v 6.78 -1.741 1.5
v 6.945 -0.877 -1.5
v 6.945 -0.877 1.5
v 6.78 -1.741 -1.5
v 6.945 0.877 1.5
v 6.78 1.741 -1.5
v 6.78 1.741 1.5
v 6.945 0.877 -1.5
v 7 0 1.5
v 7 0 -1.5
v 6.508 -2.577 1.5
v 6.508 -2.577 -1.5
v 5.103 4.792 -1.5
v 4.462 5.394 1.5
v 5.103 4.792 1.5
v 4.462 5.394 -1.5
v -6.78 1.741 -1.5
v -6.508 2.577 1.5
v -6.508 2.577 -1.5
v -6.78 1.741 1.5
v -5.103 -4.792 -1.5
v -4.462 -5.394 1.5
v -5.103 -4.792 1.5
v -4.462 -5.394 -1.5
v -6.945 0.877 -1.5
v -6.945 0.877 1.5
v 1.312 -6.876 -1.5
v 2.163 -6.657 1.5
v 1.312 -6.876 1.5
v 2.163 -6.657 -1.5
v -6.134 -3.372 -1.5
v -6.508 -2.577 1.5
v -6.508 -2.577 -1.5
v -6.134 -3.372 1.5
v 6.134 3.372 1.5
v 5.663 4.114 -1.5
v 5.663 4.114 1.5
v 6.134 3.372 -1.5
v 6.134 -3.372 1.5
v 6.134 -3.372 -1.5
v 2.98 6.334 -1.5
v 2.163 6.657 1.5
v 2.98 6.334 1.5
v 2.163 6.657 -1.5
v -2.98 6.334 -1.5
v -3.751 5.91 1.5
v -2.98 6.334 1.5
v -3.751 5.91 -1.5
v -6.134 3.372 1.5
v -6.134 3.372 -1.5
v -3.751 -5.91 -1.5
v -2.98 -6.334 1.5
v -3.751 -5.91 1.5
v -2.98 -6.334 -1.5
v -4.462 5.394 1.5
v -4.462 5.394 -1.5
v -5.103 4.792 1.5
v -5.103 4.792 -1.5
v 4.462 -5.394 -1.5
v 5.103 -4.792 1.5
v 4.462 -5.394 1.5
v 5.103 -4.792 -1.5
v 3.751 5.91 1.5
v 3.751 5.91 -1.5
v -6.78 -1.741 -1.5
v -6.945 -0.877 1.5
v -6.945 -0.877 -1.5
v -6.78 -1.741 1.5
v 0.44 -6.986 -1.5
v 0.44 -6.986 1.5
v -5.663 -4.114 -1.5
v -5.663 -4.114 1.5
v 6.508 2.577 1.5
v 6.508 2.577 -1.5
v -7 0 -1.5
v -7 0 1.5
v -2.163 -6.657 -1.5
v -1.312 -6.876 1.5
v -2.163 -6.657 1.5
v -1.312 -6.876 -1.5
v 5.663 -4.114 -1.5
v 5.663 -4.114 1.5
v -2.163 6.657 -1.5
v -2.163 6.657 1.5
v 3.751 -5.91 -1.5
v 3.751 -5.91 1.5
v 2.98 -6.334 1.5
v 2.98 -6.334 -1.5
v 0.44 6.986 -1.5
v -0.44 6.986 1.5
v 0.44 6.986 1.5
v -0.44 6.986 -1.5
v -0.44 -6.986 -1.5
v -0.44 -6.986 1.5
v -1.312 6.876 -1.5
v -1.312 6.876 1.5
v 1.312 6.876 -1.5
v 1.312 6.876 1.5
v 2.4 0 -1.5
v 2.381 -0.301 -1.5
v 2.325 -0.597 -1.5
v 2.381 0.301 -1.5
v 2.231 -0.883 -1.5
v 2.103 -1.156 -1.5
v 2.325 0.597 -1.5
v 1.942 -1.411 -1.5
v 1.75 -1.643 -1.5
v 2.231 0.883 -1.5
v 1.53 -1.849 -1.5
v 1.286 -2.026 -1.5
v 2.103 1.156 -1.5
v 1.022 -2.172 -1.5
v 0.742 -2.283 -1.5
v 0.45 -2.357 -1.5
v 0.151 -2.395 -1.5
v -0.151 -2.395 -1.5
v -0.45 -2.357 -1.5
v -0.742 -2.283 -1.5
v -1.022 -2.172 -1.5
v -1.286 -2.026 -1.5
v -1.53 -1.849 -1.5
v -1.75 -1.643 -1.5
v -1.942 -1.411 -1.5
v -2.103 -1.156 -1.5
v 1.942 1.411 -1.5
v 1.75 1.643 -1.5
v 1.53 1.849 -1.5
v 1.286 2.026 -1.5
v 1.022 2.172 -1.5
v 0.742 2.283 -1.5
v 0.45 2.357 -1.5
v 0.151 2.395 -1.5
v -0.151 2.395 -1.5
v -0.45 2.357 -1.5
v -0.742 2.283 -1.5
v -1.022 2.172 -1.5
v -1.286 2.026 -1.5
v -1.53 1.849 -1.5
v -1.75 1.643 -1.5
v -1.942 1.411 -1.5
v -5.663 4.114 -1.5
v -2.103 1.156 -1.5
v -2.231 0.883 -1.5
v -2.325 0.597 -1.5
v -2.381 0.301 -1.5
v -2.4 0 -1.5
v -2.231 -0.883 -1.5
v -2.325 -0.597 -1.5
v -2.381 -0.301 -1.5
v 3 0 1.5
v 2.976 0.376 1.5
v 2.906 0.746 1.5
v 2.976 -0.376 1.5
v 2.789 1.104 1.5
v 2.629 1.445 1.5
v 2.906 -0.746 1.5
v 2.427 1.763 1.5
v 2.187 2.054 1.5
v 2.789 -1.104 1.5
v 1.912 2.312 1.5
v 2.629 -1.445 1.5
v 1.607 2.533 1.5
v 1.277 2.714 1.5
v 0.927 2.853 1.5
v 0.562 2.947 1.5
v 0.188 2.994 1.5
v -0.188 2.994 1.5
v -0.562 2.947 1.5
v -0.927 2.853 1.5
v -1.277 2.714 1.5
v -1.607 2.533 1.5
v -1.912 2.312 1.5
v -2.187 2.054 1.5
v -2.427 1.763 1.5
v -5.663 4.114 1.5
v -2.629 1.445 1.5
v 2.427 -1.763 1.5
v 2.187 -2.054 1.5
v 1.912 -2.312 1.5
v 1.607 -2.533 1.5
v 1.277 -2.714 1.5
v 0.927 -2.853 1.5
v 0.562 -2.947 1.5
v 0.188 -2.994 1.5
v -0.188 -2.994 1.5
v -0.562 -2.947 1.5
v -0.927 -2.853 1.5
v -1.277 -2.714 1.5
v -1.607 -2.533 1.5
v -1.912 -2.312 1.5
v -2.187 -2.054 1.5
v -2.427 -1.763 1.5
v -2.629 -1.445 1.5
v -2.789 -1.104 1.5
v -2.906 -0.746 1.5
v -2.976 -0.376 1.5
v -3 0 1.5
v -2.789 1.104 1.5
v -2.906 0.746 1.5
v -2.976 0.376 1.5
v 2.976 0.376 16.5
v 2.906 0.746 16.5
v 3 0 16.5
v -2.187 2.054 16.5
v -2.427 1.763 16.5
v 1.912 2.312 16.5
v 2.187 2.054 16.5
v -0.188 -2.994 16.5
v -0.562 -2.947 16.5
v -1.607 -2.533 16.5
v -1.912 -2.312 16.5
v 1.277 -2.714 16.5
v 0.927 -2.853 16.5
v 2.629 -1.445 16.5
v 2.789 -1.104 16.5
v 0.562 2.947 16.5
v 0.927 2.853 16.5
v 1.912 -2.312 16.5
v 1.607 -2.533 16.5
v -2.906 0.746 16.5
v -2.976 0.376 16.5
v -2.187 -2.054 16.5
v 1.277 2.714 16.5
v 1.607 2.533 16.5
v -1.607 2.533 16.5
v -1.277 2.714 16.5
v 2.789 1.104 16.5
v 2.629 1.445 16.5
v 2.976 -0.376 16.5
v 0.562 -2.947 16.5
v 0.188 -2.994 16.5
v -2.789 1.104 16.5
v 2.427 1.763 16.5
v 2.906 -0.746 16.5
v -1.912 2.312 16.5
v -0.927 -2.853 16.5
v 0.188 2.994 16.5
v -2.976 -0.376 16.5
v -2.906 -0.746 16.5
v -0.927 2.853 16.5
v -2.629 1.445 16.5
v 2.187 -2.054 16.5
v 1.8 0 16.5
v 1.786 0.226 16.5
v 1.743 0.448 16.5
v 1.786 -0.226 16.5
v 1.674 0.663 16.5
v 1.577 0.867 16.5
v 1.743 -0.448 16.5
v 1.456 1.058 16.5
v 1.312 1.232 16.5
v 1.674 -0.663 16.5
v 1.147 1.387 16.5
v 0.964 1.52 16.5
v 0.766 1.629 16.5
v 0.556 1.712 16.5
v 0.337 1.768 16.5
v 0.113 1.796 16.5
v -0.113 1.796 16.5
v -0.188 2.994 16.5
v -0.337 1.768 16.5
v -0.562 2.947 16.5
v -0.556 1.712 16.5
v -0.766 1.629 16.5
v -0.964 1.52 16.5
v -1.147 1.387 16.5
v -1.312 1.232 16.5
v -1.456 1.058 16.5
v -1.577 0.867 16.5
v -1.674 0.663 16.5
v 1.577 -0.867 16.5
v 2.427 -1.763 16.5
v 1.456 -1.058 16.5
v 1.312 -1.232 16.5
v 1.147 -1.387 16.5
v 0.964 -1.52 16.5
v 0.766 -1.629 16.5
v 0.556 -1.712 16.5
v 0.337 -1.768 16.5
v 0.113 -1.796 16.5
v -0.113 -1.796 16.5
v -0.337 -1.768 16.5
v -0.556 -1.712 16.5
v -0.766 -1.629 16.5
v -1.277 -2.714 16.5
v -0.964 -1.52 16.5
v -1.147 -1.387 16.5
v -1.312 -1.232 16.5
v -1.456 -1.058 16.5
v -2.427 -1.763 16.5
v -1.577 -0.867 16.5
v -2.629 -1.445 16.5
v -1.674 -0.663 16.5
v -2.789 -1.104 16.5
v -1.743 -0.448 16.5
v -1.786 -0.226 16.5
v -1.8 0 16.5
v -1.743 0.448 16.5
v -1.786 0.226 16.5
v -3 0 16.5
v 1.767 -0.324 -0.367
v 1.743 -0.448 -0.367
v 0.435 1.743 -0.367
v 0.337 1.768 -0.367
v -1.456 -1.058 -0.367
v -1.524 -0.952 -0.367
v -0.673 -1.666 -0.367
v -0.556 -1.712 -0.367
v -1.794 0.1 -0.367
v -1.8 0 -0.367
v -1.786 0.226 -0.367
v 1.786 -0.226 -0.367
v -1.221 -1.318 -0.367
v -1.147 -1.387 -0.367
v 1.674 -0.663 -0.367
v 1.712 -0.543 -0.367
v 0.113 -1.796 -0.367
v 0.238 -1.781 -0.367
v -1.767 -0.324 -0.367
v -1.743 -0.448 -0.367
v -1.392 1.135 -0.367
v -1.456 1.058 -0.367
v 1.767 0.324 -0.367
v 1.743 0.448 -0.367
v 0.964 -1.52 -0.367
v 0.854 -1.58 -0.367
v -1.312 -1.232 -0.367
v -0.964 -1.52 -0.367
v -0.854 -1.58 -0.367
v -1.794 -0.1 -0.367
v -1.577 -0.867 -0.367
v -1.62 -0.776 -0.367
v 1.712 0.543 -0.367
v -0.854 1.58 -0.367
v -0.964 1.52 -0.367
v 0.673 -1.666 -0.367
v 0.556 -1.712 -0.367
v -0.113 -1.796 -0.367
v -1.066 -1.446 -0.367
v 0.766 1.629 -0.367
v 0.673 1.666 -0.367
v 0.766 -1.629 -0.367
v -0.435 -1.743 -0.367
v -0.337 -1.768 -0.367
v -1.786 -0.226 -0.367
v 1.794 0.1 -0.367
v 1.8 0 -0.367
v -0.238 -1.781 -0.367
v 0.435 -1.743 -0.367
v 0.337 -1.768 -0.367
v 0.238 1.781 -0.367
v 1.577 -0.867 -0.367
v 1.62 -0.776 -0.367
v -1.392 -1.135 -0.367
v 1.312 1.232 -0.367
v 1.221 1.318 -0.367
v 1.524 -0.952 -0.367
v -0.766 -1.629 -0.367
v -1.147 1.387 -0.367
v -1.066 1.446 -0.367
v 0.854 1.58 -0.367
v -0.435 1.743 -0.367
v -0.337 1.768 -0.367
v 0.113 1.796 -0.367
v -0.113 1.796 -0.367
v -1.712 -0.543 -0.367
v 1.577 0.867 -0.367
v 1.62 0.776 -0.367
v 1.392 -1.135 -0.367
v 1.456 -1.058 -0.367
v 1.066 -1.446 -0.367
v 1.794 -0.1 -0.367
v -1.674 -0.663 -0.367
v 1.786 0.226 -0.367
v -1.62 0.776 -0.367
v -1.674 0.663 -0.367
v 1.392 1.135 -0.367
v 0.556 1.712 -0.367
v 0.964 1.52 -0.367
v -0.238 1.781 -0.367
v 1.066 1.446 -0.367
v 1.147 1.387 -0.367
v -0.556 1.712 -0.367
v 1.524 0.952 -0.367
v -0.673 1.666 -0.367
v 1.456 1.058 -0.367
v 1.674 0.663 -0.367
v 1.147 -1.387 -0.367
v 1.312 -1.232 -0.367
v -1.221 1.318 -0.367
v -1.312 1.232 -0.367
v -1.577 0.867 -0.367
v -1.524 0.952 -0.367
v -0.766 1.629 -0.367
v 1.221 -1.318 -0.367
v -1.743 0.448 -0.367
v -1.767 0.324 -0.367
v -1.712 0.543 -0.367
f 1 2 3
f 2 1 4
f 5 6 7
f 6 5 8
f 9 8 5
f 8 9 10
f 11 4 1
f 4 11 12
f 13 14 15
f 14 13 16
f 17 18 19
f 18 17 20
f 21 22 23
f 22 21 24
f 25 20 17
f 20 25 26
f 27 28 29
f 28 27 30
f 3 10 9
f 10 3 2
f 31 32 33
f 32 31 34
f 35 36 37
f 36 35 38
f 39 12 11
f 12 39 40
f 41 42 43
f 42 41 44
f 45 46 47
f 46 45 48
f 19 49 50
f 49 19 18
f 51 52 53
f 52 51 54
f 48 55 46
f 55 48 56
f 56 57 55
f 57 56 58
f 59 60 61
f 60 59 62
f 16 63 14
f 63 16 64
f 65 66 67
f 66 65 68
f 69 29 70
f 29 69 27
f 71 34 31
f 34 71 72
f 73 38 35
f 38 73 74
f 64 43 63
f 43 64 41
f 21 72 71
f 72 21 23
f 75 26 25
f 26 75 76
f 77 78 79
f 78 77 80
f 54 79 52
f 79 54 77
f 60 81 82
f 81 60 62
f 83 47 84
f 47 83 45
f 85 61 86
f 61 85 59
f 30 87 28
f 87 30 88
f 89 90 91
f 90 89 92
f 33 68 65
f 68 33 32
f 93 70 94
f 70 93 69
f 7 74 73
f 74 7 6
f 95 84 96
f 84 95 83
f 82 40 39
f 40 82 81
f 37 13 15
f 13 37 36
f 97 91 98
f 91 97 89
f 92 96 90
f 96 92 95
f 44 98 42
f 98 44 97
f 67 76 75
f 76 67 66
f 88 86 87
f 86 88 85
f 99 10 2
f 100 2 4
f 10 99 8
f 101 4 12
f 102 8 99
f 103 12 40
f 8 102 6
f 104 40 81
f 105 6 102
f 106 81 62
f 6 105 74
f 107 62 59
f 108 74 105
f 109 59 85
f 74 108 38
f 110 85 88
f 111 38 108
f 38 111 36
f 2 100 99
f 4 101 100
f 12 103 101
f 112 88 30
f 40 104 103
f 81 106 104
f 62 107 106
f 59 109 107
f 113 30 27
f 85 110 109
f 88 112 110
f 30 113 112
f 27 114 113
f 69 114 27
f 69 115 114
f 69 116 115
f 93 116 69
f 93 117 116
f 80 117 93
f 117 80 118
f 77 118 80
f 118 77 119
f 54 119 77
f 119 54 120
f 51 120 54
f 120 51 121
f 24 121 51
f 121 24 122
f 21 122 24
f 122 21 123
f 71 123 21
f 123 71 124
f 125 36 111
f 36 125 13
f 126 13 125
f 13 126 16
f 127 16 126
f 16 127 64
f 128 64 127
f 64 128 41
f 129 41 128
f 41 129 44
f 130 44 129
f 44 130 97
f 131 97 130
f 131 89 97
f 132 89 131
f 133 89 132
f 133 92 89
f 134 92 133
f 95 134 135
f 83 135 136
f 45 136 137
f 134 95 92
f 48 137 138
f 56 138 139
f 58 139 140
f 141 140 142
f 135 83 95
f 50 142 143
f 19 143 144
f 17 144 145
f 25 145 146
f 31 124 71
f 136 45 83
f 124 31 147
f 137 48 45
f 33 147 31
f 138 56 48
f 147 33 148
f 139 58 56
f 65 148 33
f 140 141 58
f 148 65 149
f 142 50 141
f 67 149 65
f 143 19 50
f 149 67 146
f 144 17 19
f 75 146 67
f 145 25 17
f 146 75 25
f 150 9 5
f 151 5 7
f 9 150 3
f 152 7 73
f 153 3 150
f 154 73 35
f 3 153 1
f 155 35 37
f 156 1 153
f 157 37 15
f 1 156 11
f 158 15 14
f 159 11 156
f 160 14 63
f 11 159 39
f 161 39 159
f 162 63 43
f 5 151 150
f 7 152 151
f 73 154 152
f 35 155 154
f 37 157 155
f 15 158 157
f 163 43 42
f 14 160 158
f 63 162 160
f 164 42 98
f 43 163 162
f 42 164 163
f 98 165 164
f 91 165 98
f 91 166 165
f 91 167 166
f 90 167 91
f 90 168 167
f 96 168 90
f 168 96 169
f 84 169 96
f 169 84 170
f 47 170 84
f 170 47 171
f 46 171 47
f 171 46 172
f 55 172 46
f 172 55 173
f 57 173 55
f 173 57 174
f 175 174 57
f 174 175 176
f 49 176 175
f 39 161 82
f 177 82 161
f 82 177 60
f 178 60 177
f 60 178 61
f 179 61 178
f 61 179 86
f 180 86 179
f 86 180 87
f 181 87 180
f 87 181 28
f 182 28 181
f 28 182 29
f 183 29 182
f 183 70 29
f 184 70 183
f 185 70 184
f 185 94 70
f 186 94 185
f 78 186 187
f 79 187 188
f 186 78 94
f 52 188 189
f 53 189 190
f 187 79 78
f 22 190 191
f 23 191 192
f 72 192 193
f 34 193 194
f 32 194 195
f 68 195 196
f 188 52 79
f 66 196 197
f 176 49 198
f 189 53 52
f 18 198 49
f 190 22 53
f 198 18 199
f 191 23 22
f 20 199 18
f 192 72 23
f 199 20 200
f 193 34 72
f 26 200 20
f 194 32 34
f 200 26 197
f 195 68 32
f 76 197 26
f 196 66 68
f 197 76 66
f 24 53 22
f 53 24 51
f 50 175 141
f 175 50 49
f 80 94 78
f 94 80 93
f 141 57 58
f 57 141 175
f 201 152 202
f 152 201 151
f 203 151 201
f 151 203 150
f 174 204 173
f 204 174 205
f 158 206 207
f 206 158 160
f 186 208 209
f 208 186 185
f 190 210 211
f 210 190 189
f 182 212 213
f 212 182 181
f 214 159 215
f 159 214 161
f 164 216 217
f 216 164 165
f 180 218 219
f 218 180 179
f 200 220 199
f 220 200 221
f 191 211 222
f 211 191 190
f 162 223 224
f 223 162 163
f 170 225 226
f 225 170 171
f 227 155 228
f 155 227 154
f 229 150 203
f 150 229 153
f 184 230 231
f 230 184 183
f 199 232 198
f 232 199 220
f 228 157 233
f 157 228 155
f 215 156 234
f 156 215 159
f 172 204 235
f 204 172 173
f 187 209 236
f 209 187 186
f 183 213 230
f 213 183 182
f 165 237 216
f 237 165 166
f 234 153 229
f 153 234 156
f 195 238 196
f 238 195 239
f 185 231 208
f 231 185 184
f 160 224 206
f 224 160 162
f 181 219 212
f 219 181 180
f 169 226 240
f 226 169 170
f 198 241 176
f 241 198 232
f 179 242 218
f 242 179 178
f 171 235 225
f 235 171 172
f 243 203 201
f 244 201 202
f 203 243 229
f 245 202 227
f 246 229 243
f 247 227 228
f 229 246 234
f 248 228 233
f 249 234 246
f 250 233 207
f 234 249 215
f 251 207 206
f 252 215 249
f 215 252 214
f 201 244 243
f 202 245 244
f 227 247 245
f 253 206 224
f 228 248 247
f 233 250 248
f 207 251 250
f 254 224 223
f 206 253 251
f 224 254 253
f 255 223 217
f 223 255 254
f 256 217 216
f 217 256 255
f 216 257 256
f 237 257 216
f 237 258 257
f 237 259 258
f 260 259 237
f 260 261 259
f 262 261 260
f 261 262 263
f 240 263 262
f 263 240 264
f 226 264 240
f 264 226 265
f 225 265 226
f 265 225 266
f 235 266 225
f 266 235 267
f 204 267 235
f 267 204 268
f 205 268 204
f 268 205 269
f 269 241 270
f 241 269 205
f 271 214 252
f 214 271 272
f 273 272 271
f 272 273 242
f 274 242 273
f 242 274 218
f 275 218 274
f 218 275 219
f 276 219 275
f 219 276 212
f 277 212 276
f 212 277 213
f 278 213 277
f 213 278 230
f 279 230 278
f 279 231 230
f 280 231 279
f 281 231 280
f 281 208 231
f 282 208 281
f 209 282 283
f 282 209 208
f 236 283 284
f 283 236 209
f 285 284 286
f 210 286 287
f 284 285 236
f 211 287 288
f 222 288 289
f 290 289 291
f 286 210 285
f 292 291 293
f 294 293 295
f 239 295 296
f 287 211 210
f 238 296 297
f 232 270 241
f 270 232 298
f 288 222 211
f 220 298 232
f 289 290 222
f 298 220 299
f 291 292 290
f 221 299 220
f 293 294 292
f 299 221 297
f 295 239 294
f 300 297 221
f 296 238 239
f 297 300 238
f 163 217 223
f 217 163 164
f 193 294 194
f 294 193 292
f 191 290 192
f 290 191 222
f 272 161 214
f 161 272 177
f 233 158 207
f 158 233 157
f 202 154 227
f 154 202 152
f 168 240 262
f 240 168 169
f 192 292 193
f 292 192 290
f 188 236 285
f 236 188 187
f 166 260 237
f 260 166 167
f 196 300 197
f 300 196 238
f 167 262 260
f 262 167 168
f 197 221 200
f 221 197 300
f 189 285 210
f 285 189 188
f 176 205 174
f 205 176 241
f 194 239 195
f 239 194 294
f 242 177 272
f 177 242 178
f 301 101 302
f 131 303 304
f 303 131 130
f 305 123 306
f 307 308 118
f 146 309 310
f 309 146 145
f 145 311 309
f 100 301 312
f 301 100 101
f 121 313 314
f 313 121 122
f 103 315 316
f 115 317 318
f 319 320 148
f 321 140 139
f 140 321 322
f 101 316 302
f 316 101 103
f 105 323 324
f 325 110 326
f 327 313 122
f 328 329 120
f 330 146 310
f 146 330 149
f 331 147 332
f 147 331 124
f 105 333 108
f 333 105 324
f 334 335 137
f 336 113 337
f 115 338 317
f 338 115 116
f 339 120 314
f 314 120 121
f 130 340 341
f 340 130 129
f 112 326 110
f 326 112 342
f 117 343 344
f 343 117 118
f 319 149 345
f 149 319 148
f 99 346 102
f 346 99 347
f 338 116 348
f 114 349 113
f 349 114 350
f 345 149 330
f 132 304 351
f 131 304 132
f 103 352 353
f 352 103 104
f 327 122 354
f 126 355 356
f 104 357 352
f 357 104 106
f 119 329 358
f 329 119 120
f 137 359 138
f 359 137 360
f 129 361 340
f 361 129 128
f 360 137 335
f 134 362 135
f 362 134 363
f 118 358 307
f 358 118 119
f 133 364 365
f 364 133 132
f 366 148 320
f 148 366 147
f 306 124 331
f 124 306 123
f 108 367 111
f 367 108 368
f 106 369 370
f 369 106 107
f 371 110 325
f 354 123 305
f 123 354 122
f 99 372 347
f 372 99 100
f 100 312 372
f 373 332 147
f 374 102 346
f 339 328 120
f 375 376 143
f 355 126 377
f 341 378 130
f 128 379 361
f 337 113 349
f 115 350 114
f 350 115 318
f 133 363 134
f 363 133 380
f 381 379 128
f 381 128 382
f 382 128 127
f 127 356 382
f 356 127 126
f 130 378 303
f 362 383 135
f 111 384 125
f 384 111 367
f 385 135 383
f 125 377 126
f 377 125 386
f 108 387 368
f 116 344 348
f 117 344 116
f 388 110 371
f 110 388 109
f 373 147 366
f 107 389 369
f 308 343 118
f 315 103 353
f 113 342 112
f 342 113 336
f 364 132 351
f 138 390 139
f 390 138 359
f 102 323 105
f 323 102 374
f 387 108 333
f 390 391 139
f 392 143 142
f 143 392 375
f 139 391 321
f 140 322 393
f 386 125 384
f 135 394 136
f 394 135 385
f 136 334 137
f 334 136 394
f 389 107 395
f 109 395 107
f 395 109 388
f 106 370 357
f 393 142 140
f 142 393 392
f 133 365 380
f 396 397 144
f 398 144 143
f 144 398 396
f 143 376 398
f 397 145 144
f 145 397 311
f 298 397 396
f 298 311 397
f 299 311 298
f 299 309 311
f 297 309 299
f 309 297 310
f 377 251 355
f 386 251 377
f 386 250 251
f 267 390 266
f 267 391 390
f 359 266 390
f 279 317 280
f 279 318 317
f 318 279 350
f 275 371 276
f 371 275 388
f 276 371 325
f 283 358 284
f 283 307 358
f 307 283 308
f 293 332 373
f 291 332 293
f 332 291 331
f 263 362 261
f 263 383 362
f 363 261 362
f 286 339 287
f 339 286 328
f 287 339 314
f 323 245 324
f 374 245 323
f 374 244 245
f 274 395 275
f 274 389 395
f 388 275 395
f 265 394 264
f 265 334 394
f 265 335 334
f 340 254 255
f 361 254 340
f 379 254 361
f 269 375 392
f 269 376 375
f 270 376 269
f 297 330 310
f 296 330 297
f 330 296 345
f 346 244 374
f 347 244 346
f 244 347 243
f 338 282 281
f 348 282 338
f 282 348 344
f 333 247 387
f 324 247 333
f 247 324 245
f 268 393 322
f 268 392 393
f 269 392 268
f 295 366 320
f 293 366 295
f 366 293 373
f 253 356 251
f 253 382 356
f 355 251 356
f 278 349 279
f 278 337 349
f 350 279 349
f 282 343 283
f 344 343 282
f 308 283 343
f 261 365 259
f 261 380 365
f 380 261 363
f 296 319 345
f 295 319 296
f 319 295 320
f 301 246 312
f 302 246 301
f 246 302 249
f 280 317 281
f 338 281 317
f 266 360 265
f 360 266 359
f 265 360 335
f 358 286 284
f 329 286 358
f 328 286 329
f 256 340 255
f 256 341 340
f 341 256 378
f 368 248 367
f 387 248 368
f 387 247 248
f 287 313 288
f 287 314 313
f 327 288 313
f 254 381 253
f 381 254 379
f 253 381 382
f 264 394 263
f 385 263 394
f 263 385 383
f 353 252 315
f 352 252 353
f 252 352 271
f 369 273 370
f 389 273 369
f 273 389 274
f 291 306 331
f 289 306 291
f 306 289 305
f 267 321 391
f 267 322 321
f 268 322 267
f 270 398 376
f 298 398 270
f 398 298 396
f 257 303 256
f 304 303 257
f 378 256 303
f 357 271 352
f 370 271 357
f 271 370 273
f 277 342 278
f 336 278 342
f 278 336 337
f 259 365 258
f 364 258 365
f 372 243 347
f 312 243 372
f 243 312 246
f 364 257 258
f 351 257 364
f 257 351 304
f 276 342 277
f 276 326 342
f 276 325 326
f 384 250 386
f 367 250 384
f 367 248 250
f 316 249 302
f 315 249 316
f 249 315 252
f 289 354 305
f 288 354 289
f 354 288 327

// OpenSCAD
$fn = 50;


difference() {
	union() {
		translate(v = [0, 0, -1.5000000000]) {
			cylinder(h = 3, r = 7.0000000000);
		}
		translate(v = [0, 0, -1.5000000000]) {
			cylinder(h = 18, r = 3.0000000000);
		}
	}
	union() {
		translate(v = [0, 0, -1.5000000000]) {
			rotate(a = [0, 180, 0]) {
				difference() {
					union() {
						translate(v = [0, 0, -1.7000000000]) {
							cylinder(h = 1.7000000000, r1 = 1.5000000000, r2 = 2.4000000000);
						}
						translate(v = [0, 0, -18.0000000000]) {
							cylinder(h = 18, r = 1.5000000000);
						}
						translate(v = [0, 0, -18.0000000000]) {
							cylinder(h = 18, r = 1.8000000000);
						}
						translate(v = [0, 0, -18.0000000000]) {
							cylinder(h = 18, r = 1.5000000000);
						}
					}
					union();
				}
			}
		}
		translate(v = [0, 0, -100.0000000000]) {
			cylinder(h = 200, r = 1.5000000000);
		}
	}
}
